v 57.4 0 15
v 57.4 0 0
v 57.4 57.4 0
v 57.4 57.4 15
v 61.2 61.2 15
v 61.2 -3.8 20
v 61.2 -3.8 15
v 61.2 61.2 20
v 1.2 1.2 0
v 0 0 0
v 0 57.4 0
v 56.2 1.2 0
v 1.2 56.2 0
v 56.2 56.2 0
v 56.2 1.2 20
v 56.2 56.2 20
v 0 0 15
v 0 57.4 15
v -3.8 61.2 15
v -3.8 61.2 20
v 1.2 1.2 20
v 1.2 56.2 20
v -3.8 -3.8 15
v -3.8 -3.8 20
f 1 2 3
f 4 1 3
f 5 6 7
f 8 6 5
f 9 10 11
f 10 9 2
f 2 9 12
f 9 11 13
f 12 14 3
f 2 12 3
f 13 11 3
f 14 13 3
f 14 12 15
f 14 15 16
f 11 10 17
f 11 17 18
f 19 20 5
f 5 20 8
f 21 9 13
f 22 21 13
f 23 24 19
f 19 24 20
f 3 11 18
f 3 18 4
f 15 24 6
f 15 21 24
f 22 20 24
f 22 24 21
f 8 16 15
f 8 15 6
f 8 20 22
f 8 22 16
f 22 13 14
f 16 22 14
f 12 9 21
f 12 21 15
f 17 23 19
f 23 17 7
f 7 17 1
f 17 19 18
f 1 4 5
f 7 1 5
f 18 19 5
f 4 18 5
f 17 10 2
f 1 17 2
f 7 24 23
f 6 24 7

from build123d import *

# Parameters (mm, degrees)
F0_W     = 57.4
F0_H     = 57.4
F0_W_2   = 55
F0_H_2   = 55
F1_DEPTH = 20
F2_W     = 65
F2_H     = 65
F2_W_2   = 57.4
F2_H_2   = 57.4
F3_DEPTH = 5


with BuildPart() as f1:
    # F0 (on Top) → F1 (new body)
    with BuildSketch(Plane.XY):
        with Locations((28.7, 28.7)):
            Rectangle(F0_W, F0_H)
        with Locations((28.7, 28.7)):
            Rectangle(F0_W_2, F0_H_2, mode=Mode.SUBTRACT)
    extrude(amount=F1_DEPTH)

    # F2 (on face) → F3 (join)
    with BuildSketch(Plane.XY.offset(20)):
        with Locations((28.7, 28.7)):
            Rectangle(F2_W, F2_H)
        with Locations((28.7, 28.7)):
            Rectangle(F2_W_2, F2_H_2, mode=Mode.SUBTRACT)
    extrude(amount=-F3_DEPTH)


solid = f1.part
